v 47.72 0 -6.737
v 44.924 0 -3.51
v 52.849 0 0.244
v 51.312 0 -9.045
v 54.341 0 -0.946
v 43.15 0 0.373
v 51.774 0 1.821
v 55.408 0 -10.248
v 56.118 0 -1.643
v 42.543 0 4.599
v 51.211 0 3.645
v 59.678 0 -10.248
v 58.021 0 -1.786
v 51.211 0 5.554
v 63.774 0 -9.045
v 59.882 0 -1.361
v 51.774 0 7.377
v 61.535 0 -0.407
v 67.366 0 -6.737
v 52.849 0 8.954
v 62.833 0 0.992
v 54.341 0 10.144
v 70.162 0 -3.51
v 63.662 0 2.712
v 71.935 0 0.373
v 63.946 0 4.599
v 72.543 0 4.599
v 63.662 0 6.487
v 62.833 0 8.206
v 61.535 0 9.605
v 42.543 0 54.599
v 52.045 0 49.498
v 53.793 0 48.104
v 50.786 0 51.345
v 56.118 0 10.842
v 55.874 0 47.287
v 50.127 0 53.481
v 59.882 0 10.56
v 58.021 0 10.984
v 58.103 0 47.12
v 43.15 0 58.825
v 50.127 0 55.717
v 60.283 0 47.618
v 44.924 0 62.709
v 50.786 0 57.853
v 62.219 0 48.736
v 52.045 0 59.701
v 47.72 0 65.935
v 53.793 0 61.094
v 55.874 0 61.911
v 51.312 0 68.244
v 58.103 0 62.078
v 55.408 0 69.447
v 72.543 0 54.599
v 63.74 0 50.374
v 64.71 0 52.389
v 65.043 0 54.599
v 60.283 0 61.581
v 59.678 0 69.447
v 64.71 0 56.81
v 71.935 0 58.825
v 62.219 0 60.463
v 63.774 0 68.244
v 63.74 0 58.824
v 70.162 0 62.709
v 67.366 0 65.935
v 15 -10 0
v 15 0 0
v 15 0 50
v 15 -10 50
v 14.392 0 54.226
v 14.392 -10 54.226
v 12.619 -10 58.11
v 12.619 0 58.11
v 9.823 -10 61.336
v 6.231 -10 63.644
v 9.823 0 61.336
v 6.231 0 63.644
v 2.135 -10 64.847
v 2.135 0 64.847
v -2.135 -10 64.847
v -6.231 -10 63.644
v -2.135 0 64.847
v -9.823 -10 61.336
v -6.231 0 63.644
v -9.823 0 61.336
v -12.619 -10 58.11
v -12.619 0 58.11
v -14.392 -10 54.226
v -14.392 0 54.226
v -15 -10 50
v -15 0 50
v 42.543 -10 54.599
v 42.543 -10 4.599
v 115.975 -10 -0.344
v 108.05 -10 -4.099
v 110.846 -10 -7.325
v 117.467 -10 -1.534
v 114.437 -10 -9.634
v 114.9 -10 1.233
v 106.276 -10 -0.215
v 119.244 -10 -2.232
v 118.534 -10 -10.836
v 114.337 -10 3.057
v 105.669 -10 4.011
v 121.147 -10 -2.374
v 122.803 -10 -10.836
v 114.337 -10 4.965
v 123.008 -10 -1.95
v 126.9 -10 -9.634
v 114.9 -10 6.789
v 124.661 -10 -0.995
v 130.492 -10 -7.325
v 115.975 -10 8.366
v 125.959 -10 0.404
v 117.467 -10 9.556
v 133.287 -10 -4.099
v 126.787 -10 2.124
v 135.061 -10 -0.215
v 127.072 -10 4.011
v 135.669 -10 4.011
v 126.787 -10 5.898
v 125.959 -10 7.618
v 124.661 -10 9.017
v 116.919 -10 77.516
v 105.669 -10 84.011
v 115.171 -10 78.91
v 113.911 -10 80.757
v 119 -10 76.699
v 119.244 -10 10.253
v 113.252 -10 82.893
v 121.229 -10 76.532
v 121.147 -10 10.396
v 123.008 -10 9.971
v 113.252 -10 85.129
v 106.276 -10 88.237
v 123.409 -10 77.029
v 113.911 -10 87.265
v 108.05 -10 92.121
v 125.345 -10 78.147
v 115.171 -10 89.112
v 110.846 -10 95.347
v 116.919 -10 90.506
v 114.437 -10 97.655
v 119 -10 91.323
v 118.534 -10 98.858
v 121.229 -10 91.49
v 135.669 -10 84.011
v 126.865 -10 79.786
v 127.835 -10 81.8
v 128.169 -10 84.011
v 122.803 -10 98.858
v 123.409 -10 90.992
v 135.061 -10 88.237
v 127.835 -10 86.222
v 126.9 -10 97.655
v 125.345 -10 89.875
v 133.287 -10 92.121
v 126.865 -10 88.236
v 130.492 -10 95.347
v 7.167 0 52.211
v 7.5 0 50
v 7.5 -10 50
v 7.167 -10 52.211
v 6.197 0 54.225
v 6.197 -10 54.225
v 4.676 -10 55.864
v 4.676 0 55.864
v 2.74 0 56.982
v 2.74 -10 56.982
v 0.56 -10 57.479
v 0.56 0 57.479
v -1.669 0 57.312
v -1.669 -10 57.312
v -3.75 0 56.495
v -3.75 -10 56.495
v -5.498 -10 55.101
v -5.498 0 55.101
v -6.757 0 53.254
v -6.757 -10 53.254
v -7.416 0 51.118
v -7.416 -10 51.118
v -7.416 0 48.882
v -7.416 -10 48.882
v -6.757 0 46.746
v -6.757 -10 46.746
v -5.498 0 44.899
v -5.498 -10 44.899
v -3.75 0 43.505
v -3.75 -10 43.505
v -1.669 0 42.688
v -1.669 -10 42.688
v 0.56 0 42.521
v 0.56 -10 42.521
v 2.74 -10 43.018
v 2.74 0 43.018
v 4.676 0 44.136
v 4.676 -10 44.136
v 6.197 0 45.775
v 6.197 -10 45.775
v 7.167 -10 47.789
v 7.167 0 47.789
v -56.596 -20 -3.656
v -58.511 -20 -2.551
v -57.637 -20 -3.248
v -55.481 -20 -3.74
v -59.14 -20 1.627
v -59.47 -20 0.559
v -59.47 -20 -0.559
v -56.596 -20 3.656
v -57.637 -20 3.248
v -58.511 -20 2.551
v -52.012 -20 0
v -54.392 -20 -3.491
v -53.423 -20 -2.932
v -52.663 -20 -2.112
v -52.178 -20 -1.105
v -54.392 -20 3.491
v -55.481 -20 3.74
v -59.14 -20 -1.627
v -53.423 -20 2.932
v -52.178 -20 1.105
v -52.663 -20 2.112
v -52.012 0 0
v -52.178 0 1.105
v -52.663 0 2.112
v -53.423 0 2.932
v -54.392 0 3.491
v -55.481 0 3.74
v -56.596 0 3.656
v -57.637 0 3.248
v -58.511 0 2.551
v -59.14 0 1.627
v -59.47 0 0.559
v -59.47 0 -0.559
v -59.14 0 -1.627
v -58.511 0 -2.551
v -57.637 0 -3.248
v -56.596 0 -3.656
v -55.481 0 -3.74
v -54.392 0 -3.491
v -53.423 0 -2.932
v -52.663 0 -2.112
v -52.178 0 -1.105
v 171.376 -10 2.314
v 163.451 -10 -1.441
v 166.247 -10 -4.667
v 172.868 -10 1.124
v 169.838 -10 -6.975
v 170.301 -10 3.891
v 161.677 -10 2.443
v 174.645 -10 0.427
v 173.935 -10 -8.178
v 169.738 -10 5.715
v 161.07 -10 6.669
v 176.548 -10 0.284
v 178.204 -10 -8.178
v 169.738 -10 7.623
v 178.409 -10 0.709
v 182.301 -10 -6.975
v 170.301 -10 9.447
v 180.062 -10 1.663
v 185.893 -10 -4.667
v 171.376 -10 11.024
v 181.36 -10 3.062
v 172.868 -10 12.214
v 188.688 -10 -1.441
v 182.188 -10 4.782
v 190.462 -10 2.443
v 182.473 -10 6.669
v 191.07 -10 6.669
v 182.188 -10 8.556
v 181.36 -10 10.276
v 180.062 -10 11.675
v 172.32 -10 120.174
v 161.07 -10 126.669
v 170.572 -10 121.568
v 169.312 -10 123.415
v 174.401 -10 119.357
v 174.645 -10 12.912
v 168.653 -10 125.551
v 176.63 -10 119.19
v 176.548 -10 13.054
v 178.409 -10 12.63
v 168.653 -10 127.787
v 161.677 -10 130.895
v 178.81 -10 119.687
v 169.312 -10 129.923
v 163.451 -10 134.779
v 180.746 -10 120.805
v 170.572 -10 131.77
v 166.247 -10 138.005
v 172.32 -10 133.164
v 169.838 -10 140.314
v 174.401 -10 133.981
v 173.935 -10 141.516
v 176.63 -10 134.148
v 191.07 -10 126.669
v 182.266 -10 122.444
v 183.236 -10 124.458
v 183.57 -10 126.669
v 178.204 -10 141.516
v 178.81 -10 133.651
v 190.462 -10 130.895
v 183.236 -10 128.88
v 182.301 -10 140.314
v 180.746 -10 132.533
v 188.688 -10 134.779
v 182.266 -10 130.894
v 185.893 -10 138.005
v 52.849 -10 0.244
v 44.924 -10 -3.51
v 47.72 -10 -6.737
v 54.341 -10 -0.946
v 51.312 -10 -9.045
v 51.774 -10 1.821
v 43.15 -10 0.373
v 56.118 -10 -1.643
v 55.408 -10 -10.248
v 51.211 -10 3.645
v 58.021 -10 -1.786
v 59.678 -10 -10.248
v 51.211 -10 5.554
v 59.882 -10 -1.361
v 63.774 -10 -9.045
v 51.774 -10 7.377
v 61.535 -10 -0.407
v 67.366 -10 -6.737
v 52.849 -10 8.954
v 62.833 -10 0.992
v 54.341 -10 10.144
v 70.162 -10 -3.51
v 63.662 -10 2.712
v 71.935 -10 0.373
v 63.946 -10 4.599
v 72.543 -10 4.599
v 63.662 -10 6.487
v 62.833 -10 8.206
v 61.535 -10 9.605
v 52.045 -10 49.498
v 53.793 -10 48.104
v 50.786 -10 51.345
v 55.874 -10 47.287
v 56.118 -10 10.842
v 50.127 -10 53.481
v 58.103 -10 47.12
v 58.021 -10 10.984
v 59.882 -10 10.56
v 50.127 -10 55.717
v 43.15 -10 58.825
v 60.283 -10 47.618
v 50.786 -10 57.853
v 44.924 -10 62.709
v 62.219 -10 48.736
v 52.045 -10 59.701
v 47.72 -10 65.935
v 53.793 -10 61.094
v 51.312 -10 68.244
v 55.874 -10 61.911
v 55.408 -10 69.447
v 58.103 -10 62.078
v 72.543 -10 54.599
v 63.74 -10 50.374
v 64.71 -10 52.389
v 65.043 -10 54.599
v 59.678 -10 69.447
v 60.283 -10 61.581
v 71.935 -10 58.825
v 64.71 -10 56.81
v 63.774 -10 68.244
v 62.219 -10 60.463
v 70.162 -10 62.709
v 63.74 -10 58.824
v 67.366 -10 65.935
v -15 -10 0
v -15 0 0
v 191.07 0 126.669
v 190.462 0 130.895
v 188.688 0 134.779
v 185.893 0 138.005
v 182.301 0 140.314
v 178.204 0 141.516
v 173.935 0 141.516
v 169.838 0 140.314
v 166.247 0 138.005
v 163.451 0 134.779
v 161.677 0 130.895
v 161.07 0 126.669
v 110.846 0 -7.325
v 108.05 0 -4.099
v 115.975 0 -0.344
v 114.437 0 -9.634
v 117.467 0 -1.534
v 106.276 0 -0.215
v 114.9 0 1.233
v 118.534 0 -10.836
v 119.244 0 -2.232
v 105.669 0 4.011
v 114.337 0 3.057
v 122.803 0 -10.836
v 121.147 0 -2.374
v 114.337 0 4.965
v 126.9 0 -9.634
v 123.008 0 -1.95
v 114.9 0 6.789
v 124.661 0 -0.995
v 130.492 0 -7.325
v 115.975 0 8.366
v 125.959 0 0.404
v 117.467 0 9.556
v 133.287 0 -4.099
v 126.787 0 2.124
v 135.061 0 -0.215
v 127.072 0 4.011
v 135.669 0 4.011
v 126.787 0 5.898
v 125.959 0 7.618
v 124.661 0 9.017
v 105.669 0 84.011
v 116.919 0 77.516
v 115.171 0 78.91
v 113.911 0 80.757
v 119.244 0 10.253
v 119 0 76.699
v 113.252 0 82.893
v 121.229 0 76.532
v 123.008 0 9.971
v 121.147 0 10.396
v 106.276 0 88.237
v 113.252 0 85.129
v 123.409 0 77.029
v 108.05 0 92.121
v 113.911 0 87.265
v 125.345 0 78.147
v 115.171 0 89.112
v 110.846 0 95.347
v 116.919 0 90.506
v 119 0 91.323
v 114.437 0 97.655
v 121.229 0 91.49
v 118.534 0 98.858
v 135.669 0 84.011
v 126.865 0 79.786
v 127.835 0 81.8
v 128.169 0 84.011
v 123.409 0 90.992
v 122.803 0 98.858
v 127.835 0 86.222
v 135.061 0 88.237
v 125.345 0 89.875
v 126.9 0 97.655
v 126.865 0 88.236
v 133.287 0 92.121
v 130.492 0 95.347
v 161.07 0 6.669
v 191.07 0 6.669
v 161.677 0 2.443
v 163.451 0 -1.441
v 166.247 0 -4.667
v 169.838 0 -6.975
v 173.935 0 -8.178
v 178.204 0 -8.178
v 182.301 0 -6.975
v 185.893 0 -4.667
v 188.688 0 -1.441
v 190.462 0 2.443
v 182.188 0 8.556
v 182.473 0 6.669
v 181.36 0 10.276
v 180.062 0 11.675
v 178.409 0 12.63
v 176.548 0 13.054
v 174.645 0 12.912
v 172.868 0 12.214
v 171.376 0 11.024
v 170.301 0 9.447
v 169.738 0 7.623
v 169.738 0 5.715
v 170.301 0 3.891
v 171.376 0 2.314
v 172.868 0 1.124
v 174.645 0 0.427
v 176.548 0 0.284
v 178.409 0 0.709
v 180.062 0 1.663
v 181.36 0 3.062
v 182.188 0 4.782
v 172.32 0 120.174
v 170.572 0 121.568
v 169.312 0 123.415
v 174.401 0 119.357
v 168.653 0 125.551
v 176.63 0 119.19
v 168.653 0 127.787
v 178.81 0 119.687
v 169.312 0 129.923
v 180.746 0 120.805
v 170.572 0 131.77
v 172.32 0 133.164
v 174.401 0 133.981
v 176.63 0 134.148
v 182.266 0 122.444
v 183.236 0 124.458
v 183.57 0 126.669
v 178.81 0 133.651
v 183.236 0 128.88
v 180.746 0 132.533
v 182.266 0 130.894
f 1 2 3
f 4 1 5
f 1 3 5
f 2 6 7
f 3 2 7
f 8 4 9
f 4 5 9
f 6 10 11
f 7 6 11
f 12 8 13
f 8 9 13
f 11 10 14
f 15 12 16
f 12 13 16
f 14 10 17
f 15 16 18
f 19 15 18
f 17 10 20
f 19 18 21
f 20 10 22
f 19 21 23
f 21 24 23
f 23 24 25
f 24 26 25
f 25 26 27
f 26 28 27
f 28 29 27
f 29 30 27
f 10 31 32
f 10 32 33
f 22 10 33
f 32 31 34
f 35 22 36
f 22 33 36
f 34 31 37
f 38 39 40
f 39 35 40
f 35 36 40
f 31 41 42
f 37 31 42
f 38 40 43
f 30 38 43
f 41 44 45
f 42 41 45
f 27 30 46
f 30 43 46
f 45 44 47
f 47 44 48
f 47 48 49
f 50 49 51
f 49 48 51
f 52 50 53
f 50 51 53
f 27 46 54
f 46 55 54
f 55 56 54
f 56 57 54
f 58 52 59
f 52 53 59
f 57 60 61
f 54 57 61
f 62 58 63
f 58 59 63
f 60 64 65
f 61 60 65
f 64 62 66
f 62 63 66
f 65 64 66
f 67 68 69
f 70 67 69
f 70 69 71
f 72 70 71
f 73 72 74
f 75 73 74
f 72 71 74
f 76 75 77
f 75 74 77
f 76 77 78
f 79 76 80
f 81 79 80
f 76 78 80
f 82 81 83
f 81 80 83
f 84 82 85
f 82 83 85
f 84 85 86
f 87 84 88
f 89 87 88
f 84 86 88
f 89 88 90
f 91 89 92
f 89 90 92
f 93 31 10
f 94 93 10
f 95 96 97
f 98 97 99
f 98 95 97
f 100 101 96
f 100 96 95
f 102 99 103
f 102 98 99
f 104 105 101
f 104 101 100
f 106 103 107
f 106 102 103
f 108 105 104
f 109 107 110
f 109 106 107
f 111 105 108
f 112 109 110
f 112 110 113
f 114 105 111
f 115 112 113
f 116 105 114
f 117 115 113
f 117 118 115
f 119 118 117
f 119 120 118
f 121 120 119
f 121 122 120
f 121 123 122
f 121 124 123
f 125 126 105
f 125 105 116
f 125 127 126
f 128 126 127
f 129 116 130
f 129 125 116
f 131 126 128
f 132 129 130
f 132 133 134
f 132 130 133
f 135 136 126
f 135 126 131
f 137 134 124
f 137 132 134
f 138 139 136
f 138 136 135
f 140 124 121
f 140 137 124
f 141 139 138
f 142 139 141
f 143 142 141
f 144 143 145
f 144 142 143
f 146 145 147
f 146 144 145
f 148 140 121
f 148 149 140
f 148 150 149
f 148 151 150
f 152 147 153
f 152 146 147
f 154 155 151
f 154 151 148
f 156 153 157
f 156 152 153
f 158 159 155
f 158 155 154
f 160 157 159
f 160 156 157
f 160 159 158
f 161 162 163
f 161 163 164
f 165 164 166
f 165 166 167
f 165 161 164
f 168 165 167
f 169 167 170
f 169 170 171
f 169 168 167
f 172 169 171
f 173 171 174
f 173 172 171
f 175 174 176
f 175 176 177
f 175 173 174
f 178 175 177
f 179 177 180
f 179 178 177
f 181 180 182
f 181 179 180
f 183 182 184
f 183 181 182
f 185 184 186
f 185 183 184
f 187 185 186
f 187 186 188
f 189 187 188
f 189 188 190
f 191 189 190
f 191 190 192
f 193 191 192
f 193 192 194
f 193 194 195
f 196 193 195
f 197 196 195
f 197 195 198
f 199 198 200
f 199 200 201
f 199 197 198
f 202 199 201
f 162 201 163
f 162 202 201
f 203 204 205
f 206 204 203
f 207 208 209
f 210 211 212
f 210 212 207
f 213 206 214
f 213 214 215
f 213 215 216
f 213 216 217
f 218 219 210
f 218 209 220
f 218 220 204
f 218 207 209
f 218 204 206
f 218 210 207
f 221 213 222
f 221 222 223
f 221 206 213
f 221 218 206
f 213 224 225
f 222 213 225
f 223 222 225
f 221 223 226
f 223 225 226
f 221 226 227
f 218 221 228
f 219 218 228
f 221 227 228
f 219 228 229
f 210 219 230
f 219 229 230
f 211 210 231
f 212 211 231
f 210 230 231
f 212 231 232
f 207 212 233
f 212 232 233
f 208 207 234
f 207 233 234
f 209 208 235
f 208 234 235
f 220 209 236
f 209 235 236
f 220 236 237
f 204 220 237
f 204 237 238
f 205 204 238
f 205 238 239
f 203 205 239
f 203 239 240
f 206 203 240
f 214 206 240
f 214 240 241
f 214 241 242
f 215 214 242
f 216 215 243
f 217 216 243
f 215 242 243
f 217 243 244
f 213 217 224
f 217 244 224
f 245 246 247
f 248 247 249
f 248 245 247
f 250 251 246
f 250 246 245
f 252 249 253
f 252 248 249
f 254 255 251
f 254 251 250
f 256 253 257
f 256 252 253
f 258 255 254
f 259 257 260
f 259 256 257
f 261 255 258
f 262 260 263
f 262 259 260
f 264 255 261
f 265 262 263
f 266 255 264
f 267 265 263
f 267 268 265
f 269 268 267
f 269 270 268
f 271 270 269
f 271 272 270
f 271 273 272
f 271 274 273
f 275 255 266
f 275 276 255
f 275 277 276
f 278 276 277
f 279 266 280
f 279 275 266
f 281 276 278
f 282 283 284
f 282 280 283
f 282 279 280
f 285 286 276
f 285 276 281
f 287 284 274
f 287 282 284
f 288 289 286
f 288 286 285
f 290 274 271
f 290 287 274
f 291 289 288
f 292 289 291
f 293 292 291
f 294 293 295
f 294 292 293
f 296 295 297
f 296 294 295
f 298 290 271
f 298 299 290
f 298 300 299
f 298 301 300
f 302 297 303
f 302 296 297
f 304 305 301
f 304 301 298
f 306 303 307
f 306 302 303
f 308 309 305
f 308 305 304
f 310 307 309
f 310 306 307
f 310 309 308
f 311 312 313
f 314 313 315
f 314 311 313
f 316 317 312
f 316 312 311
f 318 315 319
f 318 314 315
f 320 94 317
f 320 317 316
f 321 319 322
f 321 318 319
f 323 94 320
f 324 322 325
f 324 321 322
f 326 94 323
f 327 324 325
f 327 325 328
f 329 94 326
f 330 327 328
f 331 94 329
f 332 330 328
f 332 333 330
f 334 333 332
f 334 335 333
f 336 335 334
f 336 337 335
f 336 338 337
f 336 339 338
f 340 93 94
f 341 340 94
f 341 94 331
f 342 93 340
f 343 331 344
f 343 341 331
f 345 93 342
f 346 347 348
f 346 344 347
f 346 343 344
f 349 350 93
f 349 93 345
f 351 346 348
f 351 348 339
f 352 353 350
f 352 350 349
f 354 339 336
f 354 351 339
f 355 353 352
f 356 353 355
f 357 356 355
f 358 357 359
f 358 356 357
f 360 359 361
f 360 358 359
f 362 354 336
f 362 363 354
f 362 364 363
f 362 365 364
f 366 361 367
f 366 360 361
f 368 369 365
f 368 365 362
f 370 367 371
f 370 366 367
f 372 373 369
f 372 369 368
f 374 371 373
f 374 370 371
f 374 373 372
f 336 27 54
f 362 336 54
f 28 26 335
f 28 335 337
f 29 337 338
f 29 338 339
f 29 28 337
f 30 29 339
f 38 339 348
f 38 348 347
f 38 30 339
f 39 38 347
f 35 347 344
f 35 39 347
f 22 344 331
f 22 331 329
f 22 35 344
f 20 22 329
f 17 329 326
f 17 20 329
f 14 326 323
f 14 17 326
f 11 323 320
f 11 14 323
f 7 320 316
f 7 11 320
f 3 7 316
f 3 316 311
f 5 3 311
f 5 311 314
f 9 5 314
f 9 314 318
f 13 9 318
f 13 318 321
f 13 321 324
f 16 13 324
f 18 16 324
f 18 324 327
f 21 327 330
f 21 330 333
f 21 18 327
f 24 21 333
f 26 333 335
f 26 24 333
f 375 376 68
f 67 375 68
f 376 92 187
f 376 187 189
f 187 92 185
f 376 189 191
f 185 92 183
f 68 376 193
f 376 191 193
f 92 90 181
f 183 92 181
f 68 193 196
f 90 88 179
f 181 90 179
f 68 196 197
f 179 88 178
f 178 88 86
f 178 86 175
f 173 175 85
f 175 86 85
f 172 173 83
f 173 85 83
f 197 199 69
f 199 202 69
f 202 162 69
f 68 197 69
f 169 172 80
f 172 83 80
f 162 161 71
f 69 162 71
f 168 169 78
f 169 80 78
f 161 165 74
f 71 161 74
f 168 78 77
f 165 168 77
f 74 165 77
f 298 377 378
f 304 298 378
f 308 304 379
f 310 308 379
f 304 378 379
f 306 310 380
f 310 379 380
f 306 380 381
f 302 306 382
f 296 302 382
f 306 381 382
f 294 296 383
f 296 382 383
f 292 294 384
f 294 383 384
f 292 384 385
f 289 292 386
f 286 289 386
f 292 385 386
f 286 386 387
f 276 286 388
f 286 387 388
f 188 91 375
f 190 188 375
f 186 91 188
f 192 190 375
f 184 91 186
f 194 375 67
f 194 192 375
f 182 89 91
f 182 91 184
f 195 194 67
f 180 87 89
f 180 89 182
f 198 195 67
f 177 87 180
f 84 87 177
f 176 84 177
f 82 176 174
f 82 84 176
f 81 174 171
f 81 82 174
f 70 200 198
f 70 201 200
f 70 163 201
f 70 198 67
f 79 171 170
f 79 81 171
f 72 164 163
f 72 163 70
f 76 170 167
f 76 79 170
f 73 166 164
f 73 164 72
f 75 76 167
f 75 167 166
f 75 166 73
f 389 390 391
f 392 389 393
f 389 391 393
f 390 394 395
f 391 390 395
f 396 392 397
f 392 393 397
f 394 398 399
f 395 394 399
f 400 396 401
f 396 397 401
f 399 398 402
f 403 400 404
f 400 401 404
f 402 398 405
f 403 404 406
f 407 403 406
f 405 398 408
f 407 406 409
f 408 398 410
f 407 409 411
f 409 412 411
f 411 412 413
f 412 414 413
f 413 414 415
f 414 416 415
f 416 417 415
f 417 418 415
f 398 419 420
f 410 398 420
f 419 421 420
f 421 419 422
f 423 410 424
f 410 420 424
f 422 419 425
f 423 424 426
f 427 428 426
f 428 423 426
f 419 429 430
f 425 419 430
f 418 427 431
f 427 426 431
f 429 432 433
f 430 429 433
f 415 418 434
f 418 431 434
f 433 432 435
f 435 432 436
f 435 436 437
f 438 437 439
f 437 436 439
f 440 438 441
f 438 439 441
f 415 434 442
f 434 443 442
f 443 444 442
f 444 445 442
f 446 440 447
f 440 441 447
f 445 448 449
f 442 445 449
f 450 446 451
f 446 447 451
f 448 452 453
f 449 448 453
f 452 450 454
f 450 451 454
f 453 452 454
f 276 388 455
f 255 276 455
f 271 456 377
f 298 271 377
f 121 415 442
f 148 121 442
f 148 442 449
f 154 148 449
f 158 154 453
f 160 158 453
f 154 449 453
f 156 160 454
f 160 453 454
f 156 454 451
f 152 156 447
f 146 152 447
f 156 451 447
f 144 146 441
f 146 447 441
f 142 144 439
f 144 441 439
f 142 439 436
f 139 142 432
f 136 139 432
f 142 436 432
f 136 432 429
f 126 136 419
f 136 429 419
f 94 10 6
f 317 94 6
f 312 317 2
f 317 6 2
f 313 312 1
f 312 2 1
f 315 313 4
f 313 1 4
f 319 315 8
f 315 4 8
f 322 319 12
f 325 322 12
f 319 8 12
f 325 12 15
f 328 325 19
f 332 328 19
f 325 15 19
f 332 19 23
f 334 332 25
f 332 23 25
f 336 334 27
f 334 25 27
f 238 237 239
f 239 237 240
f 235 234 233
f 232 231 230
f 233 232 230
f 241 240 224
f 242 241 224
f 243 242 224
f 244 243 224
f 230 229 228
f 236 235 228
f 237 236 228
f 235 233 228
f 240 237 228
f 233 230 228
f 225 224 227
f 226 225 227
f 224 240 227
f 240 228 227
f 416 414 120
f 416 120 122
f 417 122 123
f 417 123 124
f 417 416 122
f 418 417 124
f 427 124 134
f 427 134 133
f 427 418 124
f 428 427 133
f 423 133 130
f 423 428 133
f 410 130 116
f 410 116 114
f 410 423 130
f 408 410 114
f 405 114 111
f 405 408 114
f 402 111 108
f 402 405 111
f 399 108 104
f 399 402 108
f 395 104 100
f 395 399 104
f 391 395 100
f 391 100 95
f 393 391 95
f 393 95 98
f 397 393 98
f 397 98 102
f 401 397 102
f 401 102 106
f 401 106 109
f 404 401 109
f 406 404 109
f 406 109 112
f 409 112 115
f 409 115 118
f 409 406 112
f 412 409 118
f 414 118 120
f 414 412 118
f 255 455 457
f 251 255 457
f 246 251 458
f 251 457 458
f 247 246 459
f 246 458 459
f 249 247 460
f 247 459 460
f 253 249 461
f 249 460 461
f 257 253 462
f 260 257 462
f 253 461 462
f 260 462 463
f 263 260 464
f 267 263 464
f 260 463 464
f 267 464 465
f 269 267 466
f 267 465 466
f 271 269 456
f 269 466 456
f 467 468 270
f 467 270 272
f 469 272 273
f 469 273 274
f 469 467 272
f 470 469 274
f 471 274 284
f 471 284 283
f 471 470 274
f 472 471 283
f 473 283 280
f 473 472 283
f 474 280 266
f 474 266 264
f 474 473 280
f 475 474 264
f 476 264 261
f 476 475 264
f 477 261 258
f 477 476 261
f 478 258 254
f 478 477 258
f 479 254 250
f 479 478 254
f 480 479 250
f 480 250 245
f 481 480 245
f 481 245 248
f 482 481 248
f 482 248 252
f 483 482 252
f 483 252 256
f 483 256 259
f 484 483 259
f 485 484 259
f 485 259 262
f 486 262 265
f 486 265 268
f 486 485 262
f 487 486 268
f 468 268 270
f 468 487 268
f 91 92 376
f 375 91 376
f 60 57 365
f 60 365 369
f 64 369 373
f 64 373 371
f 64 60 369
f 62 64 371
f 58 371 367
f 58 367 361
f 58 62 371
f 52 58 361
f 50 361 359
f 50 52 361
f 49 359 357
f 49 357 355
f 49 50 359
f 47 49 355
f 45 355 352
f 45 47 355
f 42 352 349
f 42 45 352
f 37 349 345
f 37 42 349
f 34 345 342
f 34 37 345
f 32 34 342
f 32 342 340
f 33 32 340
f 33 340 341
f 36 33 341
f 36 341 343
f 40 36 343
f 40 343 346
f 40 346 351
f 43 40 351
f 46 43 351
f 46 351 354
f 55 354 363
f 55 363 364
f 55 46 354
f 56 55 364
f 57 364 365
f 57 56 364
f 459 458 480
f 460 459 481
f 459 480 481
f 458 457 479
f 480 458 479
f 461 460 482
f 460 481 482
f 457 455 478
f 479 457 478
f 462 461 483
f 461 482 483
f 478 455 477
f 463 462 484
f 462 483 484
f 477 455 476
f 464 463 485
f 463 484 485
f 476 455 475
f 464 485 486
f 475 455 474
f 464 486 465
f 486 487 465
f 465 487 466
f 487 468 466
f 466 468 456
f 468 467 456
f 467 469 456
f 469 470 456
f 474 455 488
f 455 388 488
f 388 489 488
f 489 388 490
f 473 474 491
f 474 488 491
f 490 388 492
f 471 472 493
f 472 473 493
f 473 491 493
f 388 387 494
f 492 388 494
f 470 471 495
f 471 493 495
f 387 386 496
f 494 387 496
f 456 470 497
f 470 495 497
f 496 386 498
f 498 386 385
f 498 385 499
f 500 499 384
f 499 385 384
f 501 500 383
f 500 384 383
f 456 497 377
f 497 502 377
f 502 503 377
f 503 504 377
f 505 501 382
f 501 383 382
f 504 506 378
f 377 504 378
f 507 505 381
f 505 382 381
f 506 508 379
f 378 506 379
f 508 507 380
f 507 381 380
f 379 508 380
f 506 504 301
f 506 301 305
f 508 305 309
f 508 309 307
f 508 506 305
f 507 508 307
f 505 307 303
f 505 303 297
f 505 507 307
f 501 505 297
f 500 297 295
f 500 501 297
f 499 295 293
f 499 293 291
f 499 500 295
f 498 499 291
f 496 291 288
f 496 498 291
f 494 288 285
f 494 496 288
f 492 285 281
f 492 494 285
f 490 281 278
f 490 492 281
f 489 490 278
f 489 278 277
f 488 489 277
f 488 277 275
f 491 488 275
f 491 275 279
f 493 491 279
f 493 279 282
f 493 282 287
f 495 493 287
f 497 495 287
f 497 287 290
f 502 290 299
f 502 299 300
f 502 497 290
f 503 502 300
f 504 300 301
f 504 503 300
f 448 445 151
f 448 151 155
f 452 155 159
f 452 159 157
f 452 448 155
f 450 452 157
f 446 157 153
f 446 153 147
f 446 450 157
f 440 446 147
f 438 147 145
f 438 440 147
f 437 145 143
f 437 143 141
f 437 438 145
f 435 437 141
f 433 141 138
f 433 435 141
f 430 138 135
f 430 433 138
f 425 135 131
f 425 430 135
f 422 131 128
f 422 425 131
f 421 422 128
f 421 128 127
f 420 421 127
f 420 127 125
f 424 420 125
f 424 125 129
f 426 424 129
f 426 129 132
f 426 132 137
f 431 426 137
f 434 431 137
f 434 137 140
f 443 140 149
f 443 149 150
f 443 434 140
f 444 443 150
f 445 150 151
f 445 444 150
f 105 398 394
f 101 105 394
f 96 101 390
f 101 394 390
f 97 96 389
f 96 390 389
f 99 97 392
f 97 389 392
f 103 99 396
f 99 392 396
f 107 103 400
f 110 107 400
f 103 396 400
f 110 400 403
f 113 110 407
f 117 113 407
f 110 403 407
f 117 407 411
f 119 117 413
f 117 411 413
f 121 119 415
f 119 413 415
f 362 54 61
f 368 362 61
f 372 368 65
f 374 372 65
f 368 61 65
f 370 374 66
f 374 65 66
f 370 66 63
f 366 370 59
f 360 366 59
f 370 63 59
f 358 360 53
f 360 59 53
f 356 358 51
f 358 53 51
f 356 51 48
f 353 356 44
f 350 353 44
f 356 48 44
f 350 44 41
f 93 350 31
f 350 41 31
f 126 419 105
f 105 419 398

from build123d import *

# Parameters (mm, degrees)
F1_R      = 7.5
F2_DEPTH  = 10
F3_R      = 7.5
F3_R_2    = 6.4030769284
F4_DEPTH  = 10
F5_R      = 7.5
F5_R_2    = 6.4030769284
F6_DEPTH  = 10
F7_R      = 7.5
F7_R_2    = 6.4030769284
F8_DEPTH  = 10
F9_R      = 3.75
F10_DEPTH = 20


with BuildPart() as f2:
    # F1 (on Front) → F2 (new body)
    with BuildSketch(Plane.XZ):
        with BuildLine():
            Line((-15, 50), (-15, 0))
            Line((-15, 0), (0, 0))
            Line((0, 0), (15, 0))
            Line((15, 0), (15, 50))
            ThreePointArc((15, 50), (0, 35), (-15, 50))
        make_face()
        with BuildLine():
            ThreePointArc((15, 50), (0, 65), (-15, 50))
            ThreePointArc((-15, 50), (0, 35), (15, 50))
        make_face()
        with Locations((0, 50)):
            Circle(F1_R, mode=Mode.SUBTRACT)
    extrude(amount=F2_DEPTH)


with BuildPart() as f4:
    # F3 (on Front) → F4 (new body)
    with BuildSketch(Plane.XZ):
        with BuildLine():
            Line((42.5428944139, 54.599240981), (42.5428944139, 4.599240981))
            ThreePointArc((42.5428944139, 4.599240981), (57.5428944139, 19.599240981), (72.5428944139, 4.599240981))
            Line((72.5428944139, 4.599240981), (72.5428944139, 54.599240981))
            ThreePointArc((72.5428944139, 54.599240981), (57.5428944139, 39.599240981), (42.5428944139, 54.599240981))
        make_face()
        with BuildLine():
            ThreePointArc((72.5428944139, 54.599240981), (57.5428944139, 69.599240981), (42.5428944139, 54.599240981))
            ThreePointArc((42.5428944139, 54.599240981), (57.5428944139, 39.599240981), (72.5428944139, 54.599240981))
        make_face()
        with Locations((57.5428944139, 54.599240981)):
            Circle(F3_R, mode=Mode.SUBTRACT)
        with BuildLine():
            ThreePointArc((72.5428944139, 4.599240981), (57.5428944139, 19.599240981), (42.5428944139, 4.599240981))
            ThreePointArc((42.5428944139, 4.599240981), (57.5428944139, -10.400759019), (72.5428944139, 4.599240981))
        make_face()
        with Locations((57.5428944139, 4.599240981)):
            Circle(F3_R_2, mode=Mode.SUBTRACT)
    extrude(amount=F4_DEPTH)


with BuildPart() as f6:
    # F5 (on Front) → F6 (new body)
    with BuildSketch(Plane.XZ):
        with BuildLine():
            Line((105.6686431542, 84.0109291673), (105.6686431542, 4.0109291673))
            ThreePointArc((105.6686431542, 4.0109291673), (120.6686431542, 19.0109291673), (135.6686431542, 4.0109291673))
            Line((135.6686431542, 4.0109291673), (135.6686431542, 84.0109291673))
            ThreePointArc((135.6686431542, 84.0109291673), (120.6686431542, 69.0109291673), (105.6686431542, 84.0109291673))
        make_face()
        with BuildLine():
            ThreePointArc((135.6686431542, 84.0109291673), (120.6686431542, 99.0109291673), (105.6686431542, 84.0109291673))
            ThreePointArc((105.6686431542, 84.0109291673), (120.6686431542, 69.0109291673), (135.6686431542, 84.0109291673))
        make_face()
        with Locations((120.6686431542, 84.0109291673)):
            Circle(F5_R, mode=Mode.SUBTRACT)
        with BuildLine():
            ThreePointArc((135.6686431542, 4.0109291673), (120.6686431542, 19.0109291673), (105.6686431542, 4.0109291673))
            ThreePointArc((105.6686431542, 4.0109291673), (120.6686431542, -10.9890708327), (135.6686431542, 4.0109291673))
        make_face()
        with Locations((120.6686431542, 4.0109291673)):
            Circle(F5_R_2, mode=Mode.SUBTRACT)
    extrude(amount=F6_DEPTH)


with BuildPart() as f8:
    # F7 (on Front) → F8 (new body)
    with BuildSketch(Plane.XZ):
        with BuildLine():
            ThreePointArc((191.0695902631, 126.6690473258), (176.0695902631, 141.6690473258), (161.0695902631, 126.6690473258))
            ThreePointArc((161.0695902631, 126.6690473258), (176.0695902631, 111.6690473258), (191.0695902631, 126.6690473258))
        make_face()
        with Locations((176.0695902631, 126.6690473258)):
            Circle(F7_R, mode=Mode.SUBTRACT)
        with BuildLine():
            Line((161.0695902631, 126.6690473258), (161.0695902631, 6.6690473258))
            ThreePointArc((161.0695902631, 6.6690473258), (176.0695902631, 21.6690473258), (191.0695902631, 6.6690473258))
            Line((191.0695902631, 6.6690473258), (191.0695902631, 126.6690473258))
            ThreePointArc((191.0695902631, 126.6690473258), (176.0695902631, 111.6690473258), (161.0695902631, 126.6690473258))
        make_face()
        with BuildLine():
            ThreePointArc((191.0695902631, 6.6690473258), (176.0695902631, 21.6690473258), (161.0695902631, 6.6690473258))
            ThreePointArc((161.0695902631, 6.6690473258), (176.0695902631, -8.3309526742), (191.0695902631, 6.6690473258))
        make_face()
        with Locations((176.0695902631, 6.6690473258)):
            Circle(F7_R_2, mode=Mode.SUBTRACT)
    extrude(amount=F8_DEPTH)


with BuildPart() as f10:
    # F9 (on Front) → F10 (new body)
    with BuildSketch(Plane.XZ):
        with Locations((-55.7615682483, 0)):
            Circle(F9_R)
    extrude(amount=F10_DEPTH)


solid = Compound([f2.part, f4.part, f6.part, f8.part, f10.part])
